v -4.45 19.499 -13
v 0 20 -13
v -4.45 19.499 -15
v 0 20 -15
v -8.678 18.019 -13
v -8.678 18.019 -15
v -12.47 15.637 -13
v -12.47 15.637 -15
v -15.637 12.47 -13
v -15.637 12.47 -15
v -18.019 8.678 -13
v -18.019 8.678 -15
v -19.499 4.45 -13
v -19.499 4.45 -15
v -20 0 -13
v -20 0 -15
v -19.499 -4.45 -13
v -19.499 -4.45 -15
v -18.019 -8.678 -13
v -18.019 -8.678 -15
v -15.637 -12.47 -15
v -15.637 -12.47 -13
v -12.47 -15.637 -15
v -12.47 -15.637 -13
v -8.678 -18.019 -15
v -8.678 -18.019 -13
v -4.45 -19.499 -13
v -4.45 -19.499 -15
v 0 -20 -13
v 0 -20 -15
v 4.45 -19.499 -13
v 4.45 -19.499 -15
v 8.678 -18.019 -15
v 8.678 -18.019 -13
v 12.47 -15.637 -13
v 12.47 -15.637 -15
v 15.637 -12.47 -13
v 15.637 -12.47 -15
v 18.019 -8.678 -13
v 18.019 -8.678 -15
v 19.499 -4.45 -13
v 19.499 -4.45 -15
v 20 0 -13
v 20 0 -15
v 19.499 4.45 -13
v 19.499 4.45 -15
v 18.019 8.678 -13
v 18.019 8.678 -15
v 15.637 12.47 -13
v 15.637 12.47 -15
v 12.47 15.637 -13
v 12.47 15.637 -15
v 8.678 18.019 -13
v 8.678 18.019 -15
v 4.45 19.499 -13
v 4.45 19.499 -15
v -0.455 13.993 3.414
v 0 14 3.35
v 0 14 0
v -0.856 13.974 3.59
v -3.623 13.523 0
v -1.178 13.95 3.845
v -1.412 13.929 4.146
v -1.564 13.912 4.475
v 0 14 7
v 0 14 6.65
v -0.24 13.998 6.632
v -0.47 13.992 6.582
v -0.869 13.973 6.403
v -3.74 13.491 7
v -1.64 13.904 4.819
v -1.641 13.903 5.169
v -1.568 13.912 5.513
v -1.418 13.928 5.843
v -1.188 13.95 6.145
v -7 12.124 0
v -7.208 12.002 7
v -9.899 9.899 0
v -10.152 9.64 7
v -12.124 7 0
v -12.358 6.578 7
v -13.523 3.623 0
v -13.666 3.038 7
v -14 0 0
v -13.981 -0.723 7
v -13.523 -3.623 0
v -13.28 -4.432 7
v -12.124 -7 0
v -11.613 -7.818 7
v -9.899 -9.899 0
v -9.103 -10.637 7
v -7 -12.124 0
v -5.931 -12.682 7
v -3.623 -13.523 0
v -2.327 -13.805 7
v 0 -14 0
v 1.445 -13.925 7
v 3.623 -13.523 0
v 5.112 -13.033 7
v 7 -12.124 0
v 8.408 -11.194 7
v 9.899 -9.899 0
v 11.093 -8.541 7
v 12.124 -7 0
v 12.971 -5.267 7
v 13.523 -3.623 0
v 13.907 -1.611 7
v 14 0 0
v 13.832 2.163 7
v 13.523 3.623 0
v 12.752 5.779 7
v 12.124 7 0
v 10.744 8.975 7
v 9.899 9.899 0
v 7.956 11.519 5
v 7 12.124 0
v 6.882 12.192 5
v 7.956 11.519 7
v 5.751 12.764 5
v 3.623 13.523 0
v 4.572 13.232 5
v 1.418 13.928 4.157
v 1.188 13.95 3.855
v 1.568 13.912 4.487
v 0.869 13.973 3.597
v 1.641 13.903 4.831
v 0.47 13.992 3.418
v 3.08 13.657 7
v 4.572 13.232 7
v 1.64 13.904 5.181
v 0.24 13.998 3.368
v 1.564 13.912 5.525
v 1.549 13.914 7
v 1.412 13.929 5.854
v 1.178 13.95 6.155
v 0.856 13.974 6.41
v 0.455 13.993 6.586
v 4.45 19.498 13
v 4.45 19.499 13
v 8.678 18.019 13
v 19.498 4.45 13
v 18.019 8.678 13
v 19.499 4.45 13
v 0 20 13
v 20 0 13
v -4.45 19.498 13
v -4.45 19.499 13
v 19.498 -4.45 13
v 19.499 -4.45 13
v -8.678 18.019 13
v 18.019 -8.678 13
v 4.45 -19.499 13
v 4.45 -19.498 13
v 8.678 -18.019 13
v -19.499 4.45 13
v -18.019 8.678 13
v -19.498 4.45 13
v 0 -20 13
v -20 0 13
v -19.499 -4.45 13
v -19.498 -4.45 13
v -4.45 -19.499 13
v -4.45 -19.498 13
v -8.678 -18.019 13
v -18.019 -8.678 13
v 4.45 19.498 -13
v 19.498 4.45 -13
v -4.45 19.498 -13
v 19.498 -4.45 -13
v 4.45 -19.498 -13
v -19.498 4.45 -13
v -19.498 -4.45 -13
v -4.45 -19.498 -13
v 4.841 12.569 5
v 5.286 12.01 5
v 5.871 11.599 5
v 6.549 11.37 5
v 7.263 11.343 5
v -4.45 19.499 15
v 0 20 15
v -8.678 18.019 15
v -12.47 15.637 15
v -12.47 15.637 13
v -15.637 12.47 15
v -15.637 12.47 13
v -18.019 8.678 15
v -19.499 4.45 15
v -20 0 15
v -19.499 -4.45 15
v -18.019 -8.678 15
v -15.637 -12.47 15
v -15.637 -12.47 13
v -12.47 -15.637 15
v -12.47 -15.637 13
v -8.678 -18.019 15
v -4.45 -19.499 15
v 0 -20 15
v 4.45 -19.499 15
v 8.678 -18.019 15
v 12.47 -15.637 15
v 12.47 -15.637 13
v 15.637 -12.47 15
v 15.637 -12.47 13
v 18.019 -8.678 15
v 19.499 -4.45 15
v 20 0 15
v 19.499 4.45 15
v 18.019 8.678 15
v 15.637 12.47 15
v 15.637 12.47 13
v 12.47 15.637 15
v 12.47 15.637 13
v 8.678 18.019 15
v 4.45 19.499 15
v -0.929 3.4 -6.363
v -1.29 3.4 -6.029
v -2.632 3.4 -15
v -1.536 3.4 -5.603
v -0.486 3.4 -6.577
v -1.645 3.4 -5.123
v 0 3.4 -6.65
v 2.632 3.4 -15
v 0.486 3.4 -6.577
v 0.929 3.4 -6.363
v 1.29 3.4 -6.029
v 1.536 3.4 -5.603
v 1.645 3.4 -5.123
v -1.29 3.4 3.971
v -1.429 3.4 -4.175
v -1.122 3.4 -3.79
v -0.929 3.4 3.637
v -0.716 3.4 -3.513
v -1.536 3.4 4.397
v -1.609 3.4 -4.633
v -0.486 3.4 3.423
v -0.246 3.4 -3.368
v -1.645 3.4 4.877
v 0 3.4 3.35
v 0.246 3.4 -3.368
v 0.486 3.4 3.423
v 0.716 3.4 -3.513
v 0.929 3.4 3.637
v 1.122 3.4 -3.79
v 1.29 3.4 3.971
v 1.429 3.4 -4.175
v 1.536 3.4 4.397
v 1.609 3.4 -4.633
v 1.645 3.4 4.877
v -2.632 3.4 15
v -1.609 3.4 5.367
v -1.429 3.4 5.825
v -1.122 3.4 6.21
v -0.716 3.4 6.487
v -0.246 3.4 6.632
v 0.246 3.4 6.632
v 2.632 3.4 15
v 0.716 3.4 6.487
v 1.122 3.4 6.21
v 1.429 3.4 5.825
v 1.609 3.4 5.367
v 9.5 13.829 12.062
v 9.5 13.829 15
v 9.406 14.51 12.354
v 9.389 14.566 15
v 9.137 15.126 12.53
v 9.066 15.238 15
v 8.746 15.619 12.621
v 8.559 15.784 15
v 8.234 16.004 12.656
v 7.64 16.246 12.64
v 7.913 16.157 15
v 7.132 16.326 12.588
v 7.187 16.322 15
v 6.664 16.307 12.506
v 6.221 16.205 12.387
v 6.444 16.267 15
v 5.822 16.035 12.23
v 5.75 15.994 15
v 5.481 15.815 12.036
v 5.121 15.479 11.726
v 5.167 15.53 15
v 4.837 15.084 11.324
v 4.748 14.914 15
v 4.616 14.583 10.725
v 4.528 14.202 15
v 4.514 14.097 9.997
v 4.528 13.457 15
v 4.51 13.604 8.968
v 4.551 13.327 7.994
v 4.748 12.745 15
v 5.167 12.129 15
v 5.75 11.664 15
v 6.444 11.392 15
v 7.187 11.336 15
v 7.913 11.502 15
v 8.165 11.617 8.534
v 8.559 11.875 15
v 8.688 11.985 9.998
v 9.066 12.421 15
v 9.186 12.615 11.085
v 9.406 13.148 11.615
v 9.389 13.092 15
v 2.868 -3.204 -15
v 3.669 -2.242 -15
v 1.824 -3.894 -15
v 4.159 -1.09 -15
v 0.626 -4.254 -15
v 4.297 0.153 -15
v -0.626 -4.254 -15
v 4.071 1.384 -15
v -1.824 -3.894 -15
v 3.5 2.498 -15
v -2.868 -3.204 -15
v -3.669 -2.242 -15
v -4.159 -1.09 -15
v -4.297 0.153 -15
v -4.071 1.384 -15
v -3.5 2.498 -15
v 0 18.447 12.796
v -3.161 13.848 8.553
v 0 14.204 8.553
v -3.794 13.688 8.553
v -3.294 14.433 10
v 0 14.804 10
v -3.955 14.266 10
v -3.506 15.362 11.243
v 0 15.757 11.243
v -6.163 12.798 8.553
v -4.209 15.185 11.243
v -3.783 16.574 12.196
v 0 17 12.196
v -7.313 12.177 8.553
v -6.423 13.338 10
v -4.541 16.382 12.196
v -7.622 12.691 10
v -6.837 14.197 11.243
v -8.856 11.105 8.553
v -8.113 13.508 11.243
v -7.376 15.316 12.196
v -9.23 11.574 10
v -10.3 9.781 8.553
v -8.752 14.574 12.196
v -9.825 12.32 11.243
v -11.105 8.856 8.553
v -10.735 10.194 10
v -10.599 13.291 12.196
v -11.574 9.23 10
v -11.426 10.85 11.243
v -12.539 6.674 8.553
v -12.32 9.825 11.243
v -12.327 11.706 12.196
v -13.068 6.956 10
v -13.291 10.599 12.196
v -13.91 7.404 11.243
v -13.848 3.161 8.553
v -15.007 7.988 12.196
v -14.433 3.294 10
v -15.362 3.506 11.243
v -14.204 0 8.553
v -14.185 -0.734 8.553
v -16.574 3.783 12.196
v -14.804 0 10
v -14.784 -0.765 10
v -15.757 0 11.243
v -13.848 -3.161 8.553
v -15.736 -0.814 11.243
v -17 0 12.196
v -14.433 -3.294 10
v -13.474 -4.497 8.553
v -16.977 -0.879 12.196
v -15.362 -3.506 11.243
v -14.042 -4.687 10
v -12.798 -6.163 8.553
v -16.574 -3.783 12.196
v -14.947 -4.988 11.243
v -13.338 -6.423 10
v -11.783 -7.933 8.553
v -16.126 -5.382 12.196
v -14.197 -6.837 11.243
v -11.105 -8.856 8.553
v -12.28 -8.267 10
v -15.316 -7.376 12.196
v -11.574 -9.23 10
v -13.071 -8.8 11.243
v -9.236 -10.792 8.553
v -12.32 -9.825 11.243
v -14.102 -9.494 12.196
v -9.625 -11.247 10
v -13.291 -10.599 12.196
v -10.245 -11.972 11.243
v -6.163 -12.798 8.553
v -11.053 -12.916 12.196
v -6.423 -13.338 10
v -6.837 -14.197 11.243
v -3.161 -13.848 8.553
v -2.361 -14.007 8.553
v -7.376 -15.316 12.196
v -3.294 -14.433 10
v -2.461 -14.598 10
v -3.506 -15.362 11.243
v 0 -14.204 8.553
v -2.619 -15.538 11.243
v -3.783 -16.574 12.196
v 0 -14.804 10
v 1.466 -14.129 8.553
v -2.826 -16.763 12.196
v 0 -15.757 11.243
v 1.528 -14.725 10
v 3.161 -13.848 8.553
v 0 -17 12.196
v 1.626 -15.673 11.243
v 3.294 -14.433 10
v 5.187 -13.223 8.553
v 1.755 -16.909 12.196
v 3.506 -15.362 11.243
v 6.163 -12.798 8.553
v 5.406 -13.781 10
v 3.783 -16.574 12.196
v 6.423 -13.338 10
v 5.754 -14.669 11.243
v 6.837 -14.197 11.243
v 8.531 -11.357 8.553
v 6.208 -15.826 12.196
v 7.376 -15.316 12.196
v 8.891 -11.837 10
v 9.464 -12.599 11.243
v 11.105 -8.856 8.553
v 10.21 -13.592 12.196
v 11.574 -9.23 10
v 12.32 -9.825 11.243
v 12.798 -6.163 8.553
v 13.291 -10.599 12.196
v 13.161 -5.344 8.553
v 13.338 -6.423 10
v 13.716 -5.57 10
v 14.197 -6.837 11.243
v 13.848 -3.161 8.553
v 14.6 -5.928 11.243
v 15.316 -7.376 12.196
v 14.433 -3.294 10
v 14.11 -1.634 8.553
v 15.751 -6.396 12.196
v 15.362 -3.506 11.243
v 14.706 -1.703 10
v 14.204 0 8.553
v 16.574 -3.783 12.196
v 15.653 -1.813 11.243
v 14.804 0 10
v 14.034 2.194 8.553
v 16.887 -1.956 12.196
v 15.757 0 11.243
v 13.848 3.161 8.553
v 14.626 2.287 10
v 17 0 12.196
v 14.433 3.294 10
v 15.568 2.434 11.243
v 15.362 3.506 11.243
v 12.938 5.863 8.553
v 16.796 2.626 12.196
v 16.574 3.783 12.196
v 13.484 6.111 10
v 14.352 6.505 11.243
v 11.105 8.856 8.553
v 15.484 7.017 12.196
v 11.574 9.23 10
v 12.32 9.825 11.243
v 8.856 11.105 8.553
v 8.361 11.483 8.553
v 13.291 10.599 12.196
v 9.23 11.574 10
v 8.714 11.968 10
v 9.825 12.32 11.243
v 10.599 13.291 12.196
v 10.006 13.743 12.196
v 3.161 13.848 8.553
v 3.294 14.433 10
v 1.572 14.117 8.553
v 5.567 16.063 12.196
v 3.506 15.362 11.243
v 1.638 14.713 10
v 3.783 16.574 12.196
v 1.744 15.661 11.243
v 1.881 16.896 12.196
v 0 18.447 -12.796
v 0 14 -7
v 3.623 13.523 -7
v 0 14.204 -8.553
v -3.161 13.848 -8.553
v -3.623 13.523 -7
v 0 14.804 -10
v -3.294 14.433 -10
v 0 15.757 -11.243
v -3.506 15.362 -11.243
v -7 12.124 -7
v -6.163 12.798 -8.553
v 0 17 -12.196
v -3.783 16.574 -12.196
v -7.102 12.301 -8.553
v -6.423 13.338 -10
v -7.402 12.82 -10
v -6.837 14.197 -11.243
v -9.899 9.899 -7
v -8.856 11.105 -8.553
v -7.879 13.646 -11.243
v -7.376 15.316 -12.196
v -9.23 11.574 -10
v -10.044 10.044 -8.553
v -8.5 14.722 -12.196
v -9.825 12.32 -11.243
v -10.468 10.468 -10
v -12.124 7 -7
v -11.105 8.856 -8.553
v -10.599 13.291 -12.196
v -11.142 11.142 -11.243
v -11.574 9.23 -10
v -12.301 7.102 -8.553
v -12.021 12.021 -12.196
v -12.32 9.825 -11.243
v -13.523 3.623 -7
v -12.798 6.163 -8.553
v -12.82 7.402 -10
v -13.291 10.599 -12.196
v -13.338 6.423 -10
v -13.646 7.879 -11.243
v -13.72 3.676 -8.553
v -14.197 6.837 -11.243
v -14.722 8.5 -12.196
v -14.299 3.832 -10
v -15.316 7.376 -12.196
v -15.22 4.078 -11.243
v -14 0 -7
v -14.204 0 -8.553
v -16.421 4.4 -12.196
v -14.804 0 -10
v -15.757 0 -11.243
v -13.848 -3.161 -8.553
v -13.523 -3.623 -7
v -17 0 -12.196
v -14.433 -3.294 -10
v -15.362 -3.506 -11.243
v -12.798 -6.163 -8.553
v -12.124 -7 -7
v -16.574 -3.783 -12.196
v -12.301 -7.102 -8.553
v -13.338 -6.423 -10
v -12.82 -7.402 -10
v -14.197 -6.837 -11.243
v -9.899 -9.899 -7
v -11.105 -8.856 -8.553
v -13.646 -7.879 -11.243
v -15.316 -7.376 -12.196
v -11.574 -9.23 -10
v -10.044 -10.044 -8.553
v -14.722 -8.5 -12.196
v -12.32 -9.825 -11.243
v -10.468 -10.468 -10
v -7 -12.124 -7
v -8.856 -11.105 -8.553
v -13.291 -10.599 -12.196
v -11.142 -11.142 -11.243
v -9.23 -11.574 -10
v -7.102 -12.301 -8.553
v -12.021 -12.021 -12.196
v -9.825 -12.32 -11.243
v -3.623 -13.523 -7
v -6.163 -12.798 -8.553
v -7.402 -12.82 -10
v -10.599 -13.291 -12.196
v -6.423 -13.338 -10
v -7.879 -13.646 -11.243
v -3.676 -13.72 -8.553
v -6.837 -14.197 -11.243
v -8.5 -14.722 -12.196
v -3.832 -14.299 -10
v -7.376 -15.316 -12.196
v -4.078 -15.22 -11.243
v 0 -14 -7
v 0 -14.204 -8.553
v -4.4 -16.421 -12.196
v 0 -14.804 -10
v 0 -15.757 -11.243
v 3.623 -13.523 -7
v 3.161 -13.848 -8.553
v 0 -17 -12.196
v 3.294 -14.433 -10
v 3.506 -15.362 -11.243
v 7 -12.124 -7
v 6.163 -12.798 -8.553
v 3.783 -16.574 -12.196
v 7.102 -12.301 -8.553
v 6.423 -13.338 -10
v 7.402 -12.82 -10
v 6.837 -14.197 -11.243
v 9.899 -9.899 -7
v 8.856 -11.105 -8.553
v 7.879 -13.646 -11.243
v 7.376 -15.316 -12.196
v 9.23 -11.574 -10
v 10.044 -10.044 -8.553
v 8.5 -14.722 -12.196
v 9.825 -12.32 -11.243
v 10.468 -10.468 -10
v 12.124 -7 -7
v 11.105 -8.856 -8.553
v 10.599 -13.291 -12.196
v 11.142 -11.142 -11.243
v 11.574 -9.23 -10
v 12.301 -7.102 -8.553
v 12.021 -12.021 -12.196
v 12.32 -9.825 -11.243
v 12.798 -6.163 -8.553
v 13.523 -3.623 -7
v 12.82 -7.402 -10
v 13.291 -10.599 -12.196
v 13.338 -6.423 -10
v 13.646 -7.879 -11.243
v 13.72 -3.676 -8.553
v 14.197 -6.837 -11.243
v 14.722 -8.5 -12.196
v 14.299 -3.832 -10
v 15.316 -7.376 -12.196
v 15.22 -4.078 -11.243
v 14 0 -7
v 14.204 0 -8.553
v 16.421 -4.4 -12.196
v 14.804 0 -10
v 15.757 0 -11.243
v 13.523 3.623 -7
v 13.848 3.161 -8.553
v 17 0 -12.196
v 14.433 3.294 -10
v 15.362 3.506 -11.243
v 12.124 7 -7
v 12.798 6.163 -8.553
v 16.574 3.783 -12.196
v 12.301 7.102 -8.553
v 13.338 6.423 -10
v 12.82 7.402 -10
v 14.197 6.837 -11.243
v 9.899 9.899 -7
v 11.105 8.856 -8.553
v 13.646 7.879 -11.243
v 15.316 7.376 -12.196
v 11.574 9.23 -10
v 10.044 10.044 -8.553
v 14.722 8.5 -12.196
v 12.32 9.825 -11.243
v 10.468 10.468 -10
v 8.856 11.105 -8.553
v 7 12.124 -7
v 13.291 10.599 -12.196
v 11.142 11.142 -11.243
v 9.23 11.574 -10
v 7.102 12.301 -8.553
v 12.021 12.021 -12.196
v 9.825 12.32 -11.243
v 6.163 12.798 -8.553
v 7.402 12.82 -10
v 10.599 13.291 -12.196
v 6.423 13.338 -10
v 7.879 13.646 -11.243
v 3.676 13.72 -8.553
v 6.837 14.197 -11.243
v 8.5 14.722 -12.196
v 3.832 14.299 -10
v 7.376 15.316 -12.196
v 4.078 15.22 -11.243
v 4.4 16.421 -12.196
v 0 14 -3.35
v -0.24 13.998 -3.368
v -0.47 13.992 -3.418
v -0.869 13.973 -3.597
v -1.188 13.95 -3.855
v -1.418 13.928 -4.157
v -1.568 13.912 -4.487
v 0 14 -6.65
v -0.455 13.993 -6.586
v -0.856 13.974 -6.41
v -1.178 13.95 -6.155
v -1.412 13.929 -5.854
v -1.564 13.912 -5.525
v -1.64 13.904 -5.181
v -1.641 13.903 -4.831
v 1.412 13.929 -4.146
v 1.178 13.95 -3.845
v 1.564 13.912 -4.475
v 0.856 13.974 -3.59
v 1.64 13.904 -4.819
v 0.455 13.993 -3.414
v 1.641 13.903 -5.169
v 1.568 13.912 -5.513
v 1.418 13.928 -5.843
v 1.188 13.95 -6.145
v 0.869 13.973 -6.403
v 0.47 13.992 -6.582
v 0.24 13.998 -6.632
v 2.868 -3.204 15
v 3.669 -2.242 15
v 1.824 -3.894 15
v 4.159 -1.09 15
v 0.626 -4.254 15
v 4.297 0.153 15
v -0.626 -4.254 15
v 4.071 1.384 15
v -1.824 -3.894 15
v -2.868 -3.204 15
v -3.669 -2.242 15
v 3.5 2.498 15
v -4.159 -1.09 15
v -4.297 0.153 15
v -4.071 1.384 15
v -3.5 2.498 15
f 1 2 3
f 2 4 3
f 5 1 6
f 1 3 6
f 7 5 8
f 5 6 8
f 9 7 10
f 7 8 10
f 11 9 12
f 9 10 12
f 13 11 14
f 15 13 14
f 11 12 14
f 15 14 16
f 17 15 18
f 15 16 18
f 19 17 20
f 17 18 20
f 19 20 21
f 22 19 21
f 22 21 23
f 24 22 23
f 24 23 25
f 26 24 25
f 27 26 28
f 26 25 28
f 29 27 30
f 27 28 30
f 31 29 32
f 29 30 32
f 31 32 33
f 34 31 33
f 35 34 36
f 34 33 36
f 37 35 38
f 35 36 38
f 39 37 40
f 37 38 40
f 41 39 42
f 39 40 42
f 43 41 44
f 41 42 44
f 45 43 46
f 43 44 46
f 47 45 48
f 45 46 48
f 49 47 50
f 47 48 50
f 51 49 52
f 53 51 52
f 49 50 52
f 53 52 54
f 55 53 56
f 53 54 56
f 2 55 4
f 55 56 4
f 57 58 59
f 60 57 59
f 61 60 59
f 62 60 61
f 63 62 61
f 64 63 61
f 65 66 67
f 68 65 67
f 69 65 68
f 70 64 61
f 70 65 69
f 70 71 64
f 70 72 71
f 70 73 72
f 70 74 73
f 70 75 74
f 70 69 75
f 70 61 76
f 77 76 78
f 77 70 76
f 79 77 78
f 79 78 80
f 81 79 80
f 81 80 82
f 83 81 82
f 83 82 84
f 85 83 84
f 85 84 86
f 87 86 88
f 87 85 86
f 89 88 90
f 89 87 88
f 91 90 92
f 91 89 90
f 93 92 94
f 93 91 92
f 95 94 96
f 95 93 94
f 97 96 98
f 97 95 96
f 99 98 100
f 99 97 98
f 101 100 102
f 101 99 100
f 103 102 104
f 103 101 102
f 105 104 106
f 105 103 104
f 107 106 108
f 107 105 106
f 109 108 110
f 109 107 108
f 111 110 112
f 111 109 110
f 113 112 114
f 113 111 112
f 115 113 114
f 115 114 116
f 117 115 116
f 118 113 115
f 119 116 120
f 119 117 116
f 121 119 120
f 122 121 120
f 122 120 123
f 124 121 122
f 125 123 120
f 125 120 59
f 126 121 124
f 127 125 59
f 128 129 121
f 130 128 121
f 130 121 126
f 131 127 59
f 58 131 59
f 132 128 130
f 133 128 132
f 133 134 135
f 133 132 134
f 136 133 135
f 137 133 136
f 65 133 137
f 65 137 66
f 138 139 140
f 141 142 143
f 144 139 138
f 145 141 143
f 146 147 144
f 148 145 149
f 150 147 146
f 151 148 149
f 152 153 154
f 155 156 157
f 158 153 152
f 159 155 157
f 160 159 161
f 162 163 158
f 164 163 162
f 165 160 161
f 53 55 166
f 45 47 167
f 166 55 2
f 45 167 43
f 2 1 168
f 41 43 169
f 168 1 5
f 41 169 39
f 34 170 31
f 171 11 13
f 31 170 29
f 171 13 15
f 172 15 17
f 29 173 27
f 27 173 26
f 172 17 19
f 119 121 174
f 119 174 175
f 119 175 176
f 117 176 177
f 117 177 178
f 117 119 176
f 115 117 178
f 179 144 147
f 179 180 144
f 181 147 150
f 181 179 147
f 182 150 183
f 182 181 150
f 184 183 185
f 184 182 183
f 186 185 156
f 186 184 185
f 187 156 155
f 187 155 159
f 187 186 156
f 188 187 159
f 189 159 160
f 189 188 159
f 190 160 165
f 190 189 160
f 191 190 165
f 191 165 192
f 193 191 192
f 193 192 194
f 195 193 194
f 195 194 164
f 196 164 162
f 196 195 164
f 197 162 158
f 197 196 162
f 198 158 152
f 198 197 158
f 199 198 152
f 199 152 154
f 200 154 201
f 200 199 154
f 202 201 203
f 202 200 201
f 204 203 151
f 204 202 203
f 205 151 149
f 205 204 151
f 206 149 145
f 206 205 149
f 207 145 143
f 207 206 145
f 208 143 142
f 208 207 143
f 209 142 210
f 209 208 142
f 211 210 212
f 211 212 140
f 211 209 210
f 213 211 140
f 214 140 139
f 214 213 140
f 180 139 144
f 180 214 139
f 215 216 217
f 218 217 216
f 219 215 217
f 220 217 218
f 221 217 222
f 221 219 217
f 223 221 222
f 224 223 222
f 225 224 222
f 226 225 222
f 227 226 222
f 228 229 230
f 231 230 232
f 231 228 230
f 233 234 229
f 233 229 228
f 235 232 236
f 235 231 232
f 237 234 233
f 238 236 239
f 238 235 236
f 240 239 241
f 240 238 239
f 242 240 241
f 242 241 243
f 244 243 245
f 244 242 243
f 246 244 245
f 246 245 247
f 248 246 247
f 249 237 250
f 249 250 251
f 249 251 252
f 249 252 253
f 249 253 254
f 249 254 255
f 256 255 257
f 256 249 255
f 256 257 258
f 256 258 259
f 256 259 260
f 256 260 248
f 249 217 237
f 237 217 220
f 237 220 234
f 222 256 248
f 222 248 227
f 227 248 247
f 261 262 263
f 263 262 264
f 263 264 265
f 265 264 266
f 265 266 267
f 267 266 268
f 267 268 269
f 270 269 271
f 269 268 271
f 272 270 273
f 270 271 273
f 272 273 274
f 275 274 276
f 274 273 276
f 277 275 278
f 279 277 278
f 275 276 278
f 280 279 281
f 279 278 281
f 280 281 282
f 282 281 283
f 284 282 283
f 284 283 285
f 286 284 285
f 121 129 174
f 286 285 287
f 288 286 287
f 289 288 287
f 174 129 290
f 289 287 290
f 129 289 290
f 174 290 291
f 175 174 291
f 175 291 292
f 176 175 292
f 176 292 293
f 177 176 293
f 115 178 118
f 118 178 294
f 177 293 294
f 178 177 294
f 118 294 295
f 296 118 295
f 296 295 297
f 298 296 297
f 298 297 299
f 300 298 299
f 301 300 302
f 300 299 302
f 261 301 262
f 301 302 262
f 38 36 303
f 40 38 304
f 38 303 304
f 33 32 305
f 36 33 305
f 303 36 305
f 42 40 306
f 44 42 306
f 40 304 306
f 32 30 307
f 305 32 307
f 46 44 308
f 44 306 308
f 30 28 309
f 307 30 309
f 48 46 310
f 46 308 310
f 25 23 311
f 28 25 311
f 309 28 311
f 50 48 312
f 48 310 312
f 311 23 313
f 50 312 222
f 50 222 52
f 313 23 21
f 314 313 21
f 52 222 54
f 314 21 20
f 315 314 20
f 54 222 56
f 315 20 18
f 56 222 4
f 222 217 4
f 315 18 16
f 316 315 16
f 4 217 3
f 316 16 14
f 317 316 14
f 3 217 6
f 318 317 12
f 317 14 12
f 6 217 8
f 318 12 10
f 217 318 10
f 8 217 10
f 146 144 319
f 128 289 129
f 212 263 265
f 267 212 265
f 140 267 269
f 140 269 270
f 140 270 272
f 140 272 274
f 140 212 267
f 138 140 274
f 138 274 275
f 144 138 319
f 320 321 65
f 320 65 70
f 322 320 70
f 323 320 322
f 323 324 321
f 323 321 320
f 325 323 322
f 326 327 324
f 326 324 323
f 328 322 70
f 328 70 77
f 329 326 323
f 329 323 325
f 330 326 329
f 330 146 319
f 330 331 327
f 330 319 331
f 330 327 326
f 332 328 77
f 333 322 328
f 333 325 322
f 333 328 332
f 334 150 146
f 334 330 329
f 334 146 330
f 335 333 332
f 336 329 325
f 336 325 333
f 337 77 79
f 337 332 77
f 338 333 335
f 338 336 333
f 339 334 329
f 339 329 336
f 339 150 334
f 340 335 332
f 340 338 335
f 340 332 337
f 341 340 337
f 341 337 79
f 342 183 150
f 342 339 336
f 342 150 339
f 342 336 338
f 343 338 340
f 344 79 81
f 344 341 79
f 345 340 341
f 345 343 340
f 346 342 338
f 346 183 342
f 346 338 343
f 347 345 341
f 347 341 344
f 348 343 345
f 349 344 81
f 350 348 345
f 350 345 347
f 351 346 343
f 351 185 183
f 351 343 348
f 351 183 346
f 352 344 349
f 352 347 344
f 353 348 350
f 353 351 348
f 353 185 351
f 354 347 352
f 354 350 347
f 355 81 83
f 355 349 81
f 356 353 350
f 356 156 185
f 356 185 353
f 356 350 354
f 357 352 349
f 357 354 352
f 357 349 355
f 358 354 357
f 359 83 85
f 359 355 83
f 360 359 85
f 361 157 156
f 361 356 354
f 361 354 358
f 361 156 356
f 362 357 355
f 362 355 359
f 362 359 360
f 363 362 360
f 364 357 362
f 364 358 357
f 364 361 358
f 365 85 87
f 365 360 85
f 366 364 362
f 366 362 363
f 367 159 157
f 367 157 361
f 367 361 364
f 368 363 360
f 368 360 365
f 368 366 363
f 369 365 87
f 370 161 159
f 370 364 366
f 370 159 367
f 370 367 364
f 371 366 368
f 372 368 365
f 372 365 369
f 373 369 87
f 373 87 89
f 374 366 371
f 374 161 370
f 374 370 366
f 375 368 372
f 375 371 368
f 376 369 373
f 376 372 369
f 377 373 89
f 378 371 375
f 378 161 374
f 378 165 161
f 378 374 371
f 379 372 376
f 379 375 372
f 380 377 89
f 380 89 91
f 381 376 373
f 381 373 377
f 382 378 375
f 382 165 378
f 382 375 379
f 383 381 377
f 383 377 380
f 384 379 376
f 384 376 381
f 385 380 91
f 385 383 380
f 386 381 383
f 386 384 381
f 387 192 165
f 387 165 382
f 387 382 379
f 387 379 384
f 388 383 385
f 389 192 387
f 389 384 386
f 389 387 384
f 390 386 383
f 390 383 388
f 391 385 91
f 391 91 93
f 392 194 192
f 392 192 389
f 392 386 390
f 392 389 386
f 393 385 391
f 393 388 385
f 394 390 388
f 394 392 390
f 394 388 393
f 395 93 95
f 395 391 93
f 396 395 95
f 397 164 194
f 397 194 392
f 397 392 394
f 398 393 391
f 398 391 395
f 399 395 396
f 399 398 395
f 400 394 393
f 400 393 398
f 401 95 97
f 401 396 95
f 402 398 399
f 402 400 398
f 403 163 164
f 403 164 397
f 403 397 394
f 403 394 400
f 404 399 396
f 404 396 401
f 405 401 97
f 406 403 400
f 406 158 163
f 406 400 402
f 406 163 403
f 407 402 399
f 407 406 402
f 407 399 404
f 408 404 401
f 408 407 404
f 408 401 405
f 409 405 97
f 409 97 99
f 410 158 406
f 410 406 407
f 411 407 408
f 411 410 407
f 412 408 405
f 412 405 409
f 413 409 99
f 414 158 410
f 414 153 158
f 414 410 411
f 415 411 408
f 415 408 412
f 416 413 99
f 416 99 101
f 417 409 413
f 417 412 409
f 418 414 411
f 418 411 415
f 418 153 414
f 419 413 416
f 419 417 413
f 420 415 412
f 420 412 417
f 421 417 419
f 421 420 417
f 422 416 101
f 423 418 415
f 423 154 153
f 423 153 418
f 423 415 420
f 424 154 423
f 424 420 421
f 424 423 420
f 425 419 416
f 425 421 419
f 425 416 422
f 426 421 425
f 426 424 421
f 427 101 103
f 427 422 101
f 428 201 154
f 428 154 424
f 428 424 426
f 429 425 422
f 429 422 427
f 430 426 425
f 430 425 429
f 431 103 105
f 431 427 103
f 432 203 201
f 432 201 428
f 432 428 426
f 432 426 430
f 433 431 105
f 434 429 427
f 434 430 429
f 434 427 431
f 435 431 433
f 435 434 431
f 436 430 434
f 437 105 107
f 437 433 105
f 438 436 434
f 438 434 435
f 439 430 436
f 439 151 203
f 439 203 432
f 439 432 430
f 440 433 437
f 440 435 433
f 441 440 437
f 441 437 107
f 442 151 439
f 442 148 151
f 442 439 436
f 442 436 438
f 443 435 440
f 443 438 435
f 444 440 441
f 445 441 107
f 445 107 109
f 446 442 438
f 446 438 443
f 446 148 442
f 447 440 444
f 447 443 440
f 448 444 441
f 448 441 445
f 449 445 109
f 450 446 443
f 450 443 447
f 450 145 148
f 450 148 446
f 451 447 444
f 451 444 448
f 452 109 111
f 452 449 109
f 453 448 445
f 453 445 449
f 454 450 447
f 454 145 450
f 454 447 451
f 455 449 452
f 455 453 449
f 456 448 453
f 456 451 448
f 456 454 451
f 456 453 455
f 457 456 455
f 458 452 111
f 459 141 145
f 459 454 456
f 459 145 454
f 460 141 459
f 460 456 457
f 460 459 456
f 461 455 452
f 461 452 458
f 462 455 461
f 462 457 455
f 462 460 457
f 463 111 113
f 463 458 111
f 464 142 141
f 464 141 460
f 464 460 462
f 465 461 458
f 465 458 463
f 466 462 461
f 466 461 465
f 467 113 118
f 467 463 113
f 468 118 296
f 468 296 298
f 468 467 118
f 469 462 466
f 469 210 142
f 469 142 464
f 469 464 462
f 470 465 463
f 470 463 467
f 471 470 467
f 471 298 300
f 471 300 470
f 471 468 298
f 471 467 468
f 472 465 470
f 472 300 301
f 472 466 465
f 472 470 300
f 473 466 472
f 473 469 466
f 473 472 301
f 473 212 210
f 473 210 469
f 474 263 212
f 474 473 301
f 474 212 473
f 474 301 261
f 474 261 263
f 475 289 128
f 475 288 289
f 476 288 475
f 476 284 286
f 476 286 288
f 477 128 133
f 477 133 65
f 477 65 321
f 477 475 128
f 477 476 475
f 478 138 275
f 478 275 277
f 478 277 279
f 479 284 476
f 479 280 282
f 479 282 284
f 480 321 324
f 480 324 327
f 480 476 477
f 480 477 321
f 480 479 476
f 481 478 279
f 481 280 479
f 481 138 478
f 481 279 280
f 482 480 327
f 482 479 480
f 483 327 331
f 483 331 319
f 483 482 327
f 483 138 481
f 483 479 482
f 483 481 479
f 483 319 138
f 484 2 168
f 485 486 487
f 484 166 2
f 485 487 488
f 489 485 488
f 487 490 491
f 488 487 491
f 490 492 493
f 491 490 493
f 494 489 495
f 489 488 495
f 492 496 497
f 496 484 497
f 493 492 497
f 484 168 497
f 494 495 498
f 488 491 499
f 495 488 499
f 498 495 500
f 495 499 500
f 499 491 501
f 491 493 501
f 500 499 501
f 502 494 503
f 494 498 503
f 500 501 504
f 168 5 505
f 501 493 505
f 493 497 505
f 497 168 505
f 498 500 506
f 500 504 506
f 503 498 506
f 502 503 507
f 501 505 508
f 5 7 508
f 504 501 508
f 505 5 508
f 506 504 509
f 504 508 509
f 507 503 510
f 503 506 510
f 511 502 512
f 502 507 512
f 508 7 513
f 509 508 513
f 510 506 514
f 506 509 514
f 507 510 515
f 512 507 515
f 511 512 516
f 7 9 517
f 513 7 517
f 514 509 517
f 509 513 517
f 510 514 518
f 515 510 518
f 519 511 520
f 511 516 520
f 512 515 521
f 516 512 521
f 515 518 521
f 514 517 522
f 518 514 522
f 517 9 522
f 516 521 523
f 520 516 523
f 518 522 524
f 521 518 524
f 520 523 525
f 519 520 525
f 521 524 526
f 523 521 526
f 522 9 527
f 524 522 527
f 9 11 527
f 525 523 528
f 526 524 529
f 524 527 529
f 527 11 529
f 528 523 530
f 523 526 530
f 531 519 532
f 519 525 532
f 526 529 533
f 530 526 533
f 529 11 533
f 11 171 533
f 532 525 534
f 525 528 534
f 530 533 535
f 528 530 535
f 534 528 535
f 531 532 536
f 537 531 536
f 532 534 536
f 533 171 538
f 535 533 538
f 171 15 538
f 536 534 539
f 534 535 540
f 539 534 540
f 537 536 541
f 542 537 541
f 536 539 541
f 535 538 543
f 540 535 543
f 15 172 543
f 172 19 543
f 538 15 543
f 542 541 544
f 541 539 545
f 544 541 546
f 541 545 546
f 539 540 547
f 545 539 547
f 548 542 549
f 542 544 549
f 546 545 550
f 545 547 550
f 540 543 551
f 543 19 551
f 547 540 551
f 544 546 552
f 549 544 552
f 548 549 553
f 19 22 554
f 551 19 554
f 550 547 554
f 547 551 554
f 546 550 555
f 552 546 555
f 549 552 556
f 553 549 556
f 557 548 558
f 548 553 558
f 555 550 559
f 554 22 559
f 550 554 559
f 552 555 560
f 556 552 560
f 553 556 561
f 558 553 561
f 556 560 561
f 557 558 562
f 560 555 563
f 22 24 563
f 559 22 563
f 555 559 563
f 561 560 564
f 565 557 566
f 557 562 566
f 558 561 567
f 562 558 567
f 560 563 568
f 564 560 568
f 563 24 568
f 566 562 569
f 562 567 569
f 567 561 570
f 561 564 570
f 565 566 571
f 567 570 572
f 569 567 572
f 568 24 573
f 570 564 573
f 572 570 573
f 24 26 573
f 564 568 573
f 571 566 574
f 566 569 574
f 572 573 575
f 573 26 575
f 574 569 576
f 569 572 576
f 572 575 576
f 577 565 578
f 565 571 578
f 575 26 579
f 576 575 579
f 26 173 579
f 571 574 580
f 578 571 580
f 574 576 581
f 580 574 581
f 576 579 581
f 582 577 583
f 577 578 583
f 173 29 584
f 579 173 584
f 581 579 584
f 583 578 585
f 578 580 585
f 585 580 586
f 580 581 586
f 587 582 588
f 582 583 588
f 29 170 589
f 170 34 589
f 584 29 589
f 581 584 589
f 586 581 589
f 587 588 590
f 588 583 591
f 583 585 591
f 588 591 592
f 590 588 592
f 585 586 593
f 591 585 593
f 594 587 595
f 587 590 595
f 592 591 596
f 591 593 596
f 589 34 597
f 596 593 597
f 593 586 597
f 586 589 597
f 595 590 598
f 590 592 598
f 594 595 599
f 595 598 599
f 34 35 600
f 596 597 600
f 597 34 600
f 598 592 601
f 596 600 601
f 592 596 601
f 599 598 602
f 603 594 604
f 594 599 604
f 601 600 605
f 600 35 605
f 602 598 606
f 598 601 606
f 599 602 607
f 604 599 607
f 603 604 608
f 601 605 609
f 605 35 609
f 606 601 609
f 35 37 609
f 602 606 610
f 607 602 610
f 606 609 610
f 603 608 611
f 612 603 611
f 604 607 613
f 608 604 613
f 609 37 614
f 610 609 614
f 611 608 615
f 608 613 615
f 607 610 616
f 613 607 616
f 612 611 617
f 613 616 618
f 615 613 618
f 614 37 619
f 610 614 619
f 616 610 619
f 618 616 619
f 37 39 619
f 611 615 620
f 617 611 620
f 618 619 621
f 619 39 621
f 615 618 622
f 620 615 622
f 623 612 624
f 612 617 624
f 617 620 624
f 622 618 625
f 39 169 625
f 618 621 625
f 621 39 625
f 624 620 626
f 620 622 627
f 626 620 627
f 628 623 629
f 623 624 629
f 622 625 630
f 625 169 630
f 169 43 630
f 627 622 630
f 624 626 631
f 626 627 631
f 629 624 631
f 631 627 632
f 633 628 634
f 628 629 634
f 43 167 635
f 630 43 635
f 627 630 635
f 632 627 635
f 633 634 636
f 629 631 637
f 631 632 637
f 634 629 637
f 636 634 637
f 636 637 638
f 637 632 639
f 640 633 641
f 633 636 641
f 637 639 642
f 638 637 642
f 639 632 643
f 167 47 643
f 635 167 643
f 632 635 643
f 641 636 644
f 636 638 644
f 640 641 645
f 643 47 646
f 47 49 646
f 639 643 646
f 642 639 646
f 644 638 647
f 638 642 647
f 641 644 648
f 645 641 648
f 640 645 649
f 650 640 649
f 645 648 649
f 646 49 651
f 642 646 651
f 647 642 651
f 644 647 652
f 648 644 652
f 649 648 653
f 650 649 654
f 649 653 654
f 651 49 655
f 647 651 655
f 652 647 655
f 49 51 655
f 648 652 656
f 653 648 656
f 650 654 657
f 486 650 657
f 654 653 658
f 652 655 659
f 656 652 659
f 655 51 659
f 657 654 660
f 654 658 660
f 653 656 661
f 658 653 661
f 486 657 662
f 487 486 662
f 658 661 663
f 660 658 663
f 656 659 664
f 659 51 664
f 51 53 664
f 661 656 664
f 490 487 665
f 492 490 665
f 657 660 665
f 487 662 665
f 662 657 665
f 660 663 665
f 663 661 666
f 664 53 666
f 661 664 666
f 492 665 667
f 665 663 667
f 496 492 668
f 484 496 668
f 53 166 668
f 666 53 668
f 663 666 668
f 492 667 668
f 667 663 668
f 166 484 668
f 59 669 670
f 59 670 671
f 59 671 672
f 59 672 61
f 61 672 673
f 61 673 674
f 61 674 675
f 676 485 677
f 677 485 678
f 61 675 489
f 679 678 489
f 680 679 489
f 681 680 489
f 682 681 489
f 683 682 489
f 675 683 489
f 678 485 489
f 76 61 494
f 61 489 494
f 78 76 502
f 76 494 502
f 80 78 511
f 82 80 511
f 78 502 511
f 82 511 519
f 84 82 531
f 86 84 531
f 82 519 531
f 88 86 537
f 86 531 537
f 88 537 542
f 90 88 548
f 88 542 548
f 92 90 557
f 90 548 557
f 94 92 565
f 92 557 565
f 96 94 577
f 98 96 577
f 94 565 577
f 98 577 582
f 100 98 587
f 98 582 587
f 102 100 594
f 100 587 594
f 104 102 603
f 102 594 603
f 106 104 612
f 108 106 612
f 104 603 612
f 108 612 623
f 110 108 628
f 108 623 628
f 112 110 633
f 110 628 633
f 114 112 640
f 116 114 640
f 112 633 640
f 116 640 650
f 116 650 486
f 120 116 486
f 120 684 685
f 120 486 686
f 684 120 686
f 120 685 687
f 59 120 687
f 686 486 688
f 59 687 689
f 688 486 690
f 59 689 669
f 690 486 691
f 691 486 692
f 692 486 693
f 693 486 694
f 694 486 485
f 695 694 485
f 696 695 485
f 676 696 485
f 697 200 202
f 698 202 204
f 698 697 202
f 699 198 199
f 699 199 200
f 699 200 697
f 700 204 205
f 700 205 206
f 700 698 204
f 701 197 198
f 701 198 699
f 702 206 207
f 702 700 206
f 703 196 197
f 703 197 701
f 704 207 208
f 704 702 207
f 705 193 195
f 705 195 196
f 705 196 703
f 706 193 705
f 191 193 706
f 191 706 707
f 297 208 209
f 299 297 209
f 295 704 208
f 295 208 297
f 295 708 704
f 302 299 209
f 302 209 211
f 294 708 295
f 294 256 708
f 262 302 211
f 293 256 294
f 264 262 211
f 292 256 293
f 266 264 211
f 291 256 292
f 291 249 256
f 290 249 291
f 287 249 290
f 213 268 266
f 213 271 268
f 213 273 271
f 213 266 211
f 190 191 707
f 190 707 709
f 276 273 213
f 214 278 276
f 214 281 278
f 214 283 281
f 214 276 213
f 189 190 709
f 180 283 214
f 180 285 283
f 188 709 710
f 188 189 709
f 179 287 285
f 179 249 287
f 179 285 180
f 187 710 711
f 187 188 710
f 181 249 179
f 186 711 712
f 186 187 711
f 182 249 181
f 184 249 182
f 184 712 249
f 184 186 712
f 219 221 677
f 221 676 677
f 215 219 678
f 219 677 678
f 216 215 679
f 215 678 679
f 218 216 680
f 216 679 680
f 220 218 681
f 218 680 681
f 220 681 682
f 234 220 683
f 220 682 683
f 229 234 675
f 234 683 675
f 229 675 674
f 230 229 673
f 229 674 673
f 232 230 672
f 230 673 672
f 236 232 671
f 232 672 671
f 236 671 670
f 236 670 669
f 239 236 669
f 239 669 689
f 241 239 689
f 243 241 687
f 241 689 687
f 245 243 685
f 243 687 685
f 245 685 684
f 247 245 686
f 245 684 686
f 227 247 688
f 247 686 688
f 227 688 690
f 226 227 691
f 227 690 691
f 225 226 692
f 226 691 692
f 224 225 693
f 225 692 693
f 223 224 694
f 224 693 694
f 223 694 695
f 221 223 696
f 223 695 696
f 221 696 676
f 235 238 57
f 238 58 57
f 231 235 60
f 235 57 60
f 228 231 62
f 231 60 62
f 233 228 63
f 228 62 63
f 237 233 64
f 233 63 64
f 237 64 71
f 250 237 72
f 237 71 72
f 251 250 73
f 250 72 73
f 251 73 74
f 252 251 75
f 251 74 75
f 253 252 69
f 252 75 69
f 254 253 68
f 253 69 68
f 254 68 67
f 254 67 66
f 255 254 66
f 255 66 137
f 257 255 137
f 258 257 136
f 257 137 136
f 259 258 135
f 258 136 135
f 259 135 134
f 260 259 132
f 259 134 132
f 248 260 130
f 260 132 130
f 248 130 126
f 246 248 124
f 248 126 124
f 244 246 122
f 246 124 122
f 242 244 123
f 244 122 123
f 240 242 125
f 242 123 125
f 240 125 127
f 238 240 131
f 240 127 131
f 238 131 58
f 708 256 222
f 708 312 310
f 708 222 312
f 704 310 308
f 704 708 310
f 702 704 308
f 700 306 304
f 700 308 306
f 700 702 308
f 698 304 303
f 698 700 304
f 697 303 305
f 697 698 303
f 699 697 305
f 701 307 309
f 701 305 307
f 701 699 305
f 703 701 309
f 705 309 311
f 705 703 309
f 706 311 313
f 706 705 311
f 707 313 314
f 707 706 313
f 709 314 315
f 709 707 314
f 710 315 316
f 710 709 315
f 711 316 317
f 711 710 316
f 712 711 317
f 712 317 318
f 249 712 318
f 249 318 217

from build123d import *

# Parameters (mm, degrees)
CUT_EXTRUDE1_DEPTH                   = 42.231056256
SKETCH5_W                            = 1.65
SKETCH5_H                            = 20
TAP_DRILL_FOR_M4X0_7_TAP1_AT_2_COUNT = 2
TAP_DRILL_FOR_M4X0_7_TAP1_AT_2_PITCH = 10
FILLET_2_R                           = 6
SKETCH6_R                            = 2.5
CUT_EXTRUDE2_DEPTH                   = 10


with BuildPart() as part:
    # Sketch1 → Revolve1 (revolve)
    with BuildSketch(Plane(origin=(0, 0, 0), x_dir=(0, 0, -1), z_dir=(1, 0, 0))):
        Polygon((0, 0), (0, 14), (13, 14), (13, 20), (15, 20), (15, 0), align=None)
    revolve1 = revolve(axis=Axis((0, 0, -15), (0, 0, 1)))

    # Mirror1: Revolve1 across plane
    add(revolve1.mirror(Plane.XY))

    # Sketch2 → Cut-Extrude1 (cut, through all)
    with BuildSketch(Plane.XY.offset(15)):
        with BuildLine():
            Line((-2.632489316, 3.4), (2.632489316, 3.4))
            ThreePointArc((2.632489316, 3.4), (0, -4.3), (-2.632489316, 3.4))
        make_face()
    extrude(amount=-CUT_EXTRUDE1_DEPTH, mode=Mode.SUBTRACT)

    # Sketch5 → Tap Drill for M4x0.7 Tap1 (revolve, cut)
    with BuildSketch(Plane(origin=(0, 0, -5), x_dir=(0, 0, -1), z_dir=(1, 0, 0))):
        with Locations((0.825, 10)):
            Rectangle(SKETCH5_W, SKETCH5_H)
    tap_drill_for_m4x0_7_tap1 = revolve(axis=Axis((0, -6.35, -5), (0, 1, 0)), mode=Mode.SUBTRACT)

    # Tap Drill for M4x0.7 Tap1 at 2: Tap Drill for M4x0.7 Tap1 ×2
    with Locations(*[(0, 0, i * TAP_DRILL_FOR_M4X0_7_TAP1_AT_2_PITCH) for i in range(1, TAP_DRILL_FOR_M4X0_7_TAP1_AT_2_COUNT)]):
        add(tap_drill_for_m4x0_7_tap1, mode=Mode.SUBTRACT)

    # Fillet 2
    fillet_2_edges = [part.edges().sort_by_distance(p)[0] for p in [
        (0, -14, 13),
        (0, -14, -13),
    ]]
    fillet(fillet_2_edges, radius=FILLET_2_R - 0.0001)  # a hair under: the kernel refuses the full size

    # Sketch6 → Cut-Extrude2 (cut)
    with BuildSketch(Plane.XY.offset(15)):
        with Locations((7, 13.829316686)):
            Circle(SKETCH6_R)
    extrude(amount=-CUT_EXTRUDE2_DEPTH, mode=Mode.SUBTRACT)


solid = part.part
